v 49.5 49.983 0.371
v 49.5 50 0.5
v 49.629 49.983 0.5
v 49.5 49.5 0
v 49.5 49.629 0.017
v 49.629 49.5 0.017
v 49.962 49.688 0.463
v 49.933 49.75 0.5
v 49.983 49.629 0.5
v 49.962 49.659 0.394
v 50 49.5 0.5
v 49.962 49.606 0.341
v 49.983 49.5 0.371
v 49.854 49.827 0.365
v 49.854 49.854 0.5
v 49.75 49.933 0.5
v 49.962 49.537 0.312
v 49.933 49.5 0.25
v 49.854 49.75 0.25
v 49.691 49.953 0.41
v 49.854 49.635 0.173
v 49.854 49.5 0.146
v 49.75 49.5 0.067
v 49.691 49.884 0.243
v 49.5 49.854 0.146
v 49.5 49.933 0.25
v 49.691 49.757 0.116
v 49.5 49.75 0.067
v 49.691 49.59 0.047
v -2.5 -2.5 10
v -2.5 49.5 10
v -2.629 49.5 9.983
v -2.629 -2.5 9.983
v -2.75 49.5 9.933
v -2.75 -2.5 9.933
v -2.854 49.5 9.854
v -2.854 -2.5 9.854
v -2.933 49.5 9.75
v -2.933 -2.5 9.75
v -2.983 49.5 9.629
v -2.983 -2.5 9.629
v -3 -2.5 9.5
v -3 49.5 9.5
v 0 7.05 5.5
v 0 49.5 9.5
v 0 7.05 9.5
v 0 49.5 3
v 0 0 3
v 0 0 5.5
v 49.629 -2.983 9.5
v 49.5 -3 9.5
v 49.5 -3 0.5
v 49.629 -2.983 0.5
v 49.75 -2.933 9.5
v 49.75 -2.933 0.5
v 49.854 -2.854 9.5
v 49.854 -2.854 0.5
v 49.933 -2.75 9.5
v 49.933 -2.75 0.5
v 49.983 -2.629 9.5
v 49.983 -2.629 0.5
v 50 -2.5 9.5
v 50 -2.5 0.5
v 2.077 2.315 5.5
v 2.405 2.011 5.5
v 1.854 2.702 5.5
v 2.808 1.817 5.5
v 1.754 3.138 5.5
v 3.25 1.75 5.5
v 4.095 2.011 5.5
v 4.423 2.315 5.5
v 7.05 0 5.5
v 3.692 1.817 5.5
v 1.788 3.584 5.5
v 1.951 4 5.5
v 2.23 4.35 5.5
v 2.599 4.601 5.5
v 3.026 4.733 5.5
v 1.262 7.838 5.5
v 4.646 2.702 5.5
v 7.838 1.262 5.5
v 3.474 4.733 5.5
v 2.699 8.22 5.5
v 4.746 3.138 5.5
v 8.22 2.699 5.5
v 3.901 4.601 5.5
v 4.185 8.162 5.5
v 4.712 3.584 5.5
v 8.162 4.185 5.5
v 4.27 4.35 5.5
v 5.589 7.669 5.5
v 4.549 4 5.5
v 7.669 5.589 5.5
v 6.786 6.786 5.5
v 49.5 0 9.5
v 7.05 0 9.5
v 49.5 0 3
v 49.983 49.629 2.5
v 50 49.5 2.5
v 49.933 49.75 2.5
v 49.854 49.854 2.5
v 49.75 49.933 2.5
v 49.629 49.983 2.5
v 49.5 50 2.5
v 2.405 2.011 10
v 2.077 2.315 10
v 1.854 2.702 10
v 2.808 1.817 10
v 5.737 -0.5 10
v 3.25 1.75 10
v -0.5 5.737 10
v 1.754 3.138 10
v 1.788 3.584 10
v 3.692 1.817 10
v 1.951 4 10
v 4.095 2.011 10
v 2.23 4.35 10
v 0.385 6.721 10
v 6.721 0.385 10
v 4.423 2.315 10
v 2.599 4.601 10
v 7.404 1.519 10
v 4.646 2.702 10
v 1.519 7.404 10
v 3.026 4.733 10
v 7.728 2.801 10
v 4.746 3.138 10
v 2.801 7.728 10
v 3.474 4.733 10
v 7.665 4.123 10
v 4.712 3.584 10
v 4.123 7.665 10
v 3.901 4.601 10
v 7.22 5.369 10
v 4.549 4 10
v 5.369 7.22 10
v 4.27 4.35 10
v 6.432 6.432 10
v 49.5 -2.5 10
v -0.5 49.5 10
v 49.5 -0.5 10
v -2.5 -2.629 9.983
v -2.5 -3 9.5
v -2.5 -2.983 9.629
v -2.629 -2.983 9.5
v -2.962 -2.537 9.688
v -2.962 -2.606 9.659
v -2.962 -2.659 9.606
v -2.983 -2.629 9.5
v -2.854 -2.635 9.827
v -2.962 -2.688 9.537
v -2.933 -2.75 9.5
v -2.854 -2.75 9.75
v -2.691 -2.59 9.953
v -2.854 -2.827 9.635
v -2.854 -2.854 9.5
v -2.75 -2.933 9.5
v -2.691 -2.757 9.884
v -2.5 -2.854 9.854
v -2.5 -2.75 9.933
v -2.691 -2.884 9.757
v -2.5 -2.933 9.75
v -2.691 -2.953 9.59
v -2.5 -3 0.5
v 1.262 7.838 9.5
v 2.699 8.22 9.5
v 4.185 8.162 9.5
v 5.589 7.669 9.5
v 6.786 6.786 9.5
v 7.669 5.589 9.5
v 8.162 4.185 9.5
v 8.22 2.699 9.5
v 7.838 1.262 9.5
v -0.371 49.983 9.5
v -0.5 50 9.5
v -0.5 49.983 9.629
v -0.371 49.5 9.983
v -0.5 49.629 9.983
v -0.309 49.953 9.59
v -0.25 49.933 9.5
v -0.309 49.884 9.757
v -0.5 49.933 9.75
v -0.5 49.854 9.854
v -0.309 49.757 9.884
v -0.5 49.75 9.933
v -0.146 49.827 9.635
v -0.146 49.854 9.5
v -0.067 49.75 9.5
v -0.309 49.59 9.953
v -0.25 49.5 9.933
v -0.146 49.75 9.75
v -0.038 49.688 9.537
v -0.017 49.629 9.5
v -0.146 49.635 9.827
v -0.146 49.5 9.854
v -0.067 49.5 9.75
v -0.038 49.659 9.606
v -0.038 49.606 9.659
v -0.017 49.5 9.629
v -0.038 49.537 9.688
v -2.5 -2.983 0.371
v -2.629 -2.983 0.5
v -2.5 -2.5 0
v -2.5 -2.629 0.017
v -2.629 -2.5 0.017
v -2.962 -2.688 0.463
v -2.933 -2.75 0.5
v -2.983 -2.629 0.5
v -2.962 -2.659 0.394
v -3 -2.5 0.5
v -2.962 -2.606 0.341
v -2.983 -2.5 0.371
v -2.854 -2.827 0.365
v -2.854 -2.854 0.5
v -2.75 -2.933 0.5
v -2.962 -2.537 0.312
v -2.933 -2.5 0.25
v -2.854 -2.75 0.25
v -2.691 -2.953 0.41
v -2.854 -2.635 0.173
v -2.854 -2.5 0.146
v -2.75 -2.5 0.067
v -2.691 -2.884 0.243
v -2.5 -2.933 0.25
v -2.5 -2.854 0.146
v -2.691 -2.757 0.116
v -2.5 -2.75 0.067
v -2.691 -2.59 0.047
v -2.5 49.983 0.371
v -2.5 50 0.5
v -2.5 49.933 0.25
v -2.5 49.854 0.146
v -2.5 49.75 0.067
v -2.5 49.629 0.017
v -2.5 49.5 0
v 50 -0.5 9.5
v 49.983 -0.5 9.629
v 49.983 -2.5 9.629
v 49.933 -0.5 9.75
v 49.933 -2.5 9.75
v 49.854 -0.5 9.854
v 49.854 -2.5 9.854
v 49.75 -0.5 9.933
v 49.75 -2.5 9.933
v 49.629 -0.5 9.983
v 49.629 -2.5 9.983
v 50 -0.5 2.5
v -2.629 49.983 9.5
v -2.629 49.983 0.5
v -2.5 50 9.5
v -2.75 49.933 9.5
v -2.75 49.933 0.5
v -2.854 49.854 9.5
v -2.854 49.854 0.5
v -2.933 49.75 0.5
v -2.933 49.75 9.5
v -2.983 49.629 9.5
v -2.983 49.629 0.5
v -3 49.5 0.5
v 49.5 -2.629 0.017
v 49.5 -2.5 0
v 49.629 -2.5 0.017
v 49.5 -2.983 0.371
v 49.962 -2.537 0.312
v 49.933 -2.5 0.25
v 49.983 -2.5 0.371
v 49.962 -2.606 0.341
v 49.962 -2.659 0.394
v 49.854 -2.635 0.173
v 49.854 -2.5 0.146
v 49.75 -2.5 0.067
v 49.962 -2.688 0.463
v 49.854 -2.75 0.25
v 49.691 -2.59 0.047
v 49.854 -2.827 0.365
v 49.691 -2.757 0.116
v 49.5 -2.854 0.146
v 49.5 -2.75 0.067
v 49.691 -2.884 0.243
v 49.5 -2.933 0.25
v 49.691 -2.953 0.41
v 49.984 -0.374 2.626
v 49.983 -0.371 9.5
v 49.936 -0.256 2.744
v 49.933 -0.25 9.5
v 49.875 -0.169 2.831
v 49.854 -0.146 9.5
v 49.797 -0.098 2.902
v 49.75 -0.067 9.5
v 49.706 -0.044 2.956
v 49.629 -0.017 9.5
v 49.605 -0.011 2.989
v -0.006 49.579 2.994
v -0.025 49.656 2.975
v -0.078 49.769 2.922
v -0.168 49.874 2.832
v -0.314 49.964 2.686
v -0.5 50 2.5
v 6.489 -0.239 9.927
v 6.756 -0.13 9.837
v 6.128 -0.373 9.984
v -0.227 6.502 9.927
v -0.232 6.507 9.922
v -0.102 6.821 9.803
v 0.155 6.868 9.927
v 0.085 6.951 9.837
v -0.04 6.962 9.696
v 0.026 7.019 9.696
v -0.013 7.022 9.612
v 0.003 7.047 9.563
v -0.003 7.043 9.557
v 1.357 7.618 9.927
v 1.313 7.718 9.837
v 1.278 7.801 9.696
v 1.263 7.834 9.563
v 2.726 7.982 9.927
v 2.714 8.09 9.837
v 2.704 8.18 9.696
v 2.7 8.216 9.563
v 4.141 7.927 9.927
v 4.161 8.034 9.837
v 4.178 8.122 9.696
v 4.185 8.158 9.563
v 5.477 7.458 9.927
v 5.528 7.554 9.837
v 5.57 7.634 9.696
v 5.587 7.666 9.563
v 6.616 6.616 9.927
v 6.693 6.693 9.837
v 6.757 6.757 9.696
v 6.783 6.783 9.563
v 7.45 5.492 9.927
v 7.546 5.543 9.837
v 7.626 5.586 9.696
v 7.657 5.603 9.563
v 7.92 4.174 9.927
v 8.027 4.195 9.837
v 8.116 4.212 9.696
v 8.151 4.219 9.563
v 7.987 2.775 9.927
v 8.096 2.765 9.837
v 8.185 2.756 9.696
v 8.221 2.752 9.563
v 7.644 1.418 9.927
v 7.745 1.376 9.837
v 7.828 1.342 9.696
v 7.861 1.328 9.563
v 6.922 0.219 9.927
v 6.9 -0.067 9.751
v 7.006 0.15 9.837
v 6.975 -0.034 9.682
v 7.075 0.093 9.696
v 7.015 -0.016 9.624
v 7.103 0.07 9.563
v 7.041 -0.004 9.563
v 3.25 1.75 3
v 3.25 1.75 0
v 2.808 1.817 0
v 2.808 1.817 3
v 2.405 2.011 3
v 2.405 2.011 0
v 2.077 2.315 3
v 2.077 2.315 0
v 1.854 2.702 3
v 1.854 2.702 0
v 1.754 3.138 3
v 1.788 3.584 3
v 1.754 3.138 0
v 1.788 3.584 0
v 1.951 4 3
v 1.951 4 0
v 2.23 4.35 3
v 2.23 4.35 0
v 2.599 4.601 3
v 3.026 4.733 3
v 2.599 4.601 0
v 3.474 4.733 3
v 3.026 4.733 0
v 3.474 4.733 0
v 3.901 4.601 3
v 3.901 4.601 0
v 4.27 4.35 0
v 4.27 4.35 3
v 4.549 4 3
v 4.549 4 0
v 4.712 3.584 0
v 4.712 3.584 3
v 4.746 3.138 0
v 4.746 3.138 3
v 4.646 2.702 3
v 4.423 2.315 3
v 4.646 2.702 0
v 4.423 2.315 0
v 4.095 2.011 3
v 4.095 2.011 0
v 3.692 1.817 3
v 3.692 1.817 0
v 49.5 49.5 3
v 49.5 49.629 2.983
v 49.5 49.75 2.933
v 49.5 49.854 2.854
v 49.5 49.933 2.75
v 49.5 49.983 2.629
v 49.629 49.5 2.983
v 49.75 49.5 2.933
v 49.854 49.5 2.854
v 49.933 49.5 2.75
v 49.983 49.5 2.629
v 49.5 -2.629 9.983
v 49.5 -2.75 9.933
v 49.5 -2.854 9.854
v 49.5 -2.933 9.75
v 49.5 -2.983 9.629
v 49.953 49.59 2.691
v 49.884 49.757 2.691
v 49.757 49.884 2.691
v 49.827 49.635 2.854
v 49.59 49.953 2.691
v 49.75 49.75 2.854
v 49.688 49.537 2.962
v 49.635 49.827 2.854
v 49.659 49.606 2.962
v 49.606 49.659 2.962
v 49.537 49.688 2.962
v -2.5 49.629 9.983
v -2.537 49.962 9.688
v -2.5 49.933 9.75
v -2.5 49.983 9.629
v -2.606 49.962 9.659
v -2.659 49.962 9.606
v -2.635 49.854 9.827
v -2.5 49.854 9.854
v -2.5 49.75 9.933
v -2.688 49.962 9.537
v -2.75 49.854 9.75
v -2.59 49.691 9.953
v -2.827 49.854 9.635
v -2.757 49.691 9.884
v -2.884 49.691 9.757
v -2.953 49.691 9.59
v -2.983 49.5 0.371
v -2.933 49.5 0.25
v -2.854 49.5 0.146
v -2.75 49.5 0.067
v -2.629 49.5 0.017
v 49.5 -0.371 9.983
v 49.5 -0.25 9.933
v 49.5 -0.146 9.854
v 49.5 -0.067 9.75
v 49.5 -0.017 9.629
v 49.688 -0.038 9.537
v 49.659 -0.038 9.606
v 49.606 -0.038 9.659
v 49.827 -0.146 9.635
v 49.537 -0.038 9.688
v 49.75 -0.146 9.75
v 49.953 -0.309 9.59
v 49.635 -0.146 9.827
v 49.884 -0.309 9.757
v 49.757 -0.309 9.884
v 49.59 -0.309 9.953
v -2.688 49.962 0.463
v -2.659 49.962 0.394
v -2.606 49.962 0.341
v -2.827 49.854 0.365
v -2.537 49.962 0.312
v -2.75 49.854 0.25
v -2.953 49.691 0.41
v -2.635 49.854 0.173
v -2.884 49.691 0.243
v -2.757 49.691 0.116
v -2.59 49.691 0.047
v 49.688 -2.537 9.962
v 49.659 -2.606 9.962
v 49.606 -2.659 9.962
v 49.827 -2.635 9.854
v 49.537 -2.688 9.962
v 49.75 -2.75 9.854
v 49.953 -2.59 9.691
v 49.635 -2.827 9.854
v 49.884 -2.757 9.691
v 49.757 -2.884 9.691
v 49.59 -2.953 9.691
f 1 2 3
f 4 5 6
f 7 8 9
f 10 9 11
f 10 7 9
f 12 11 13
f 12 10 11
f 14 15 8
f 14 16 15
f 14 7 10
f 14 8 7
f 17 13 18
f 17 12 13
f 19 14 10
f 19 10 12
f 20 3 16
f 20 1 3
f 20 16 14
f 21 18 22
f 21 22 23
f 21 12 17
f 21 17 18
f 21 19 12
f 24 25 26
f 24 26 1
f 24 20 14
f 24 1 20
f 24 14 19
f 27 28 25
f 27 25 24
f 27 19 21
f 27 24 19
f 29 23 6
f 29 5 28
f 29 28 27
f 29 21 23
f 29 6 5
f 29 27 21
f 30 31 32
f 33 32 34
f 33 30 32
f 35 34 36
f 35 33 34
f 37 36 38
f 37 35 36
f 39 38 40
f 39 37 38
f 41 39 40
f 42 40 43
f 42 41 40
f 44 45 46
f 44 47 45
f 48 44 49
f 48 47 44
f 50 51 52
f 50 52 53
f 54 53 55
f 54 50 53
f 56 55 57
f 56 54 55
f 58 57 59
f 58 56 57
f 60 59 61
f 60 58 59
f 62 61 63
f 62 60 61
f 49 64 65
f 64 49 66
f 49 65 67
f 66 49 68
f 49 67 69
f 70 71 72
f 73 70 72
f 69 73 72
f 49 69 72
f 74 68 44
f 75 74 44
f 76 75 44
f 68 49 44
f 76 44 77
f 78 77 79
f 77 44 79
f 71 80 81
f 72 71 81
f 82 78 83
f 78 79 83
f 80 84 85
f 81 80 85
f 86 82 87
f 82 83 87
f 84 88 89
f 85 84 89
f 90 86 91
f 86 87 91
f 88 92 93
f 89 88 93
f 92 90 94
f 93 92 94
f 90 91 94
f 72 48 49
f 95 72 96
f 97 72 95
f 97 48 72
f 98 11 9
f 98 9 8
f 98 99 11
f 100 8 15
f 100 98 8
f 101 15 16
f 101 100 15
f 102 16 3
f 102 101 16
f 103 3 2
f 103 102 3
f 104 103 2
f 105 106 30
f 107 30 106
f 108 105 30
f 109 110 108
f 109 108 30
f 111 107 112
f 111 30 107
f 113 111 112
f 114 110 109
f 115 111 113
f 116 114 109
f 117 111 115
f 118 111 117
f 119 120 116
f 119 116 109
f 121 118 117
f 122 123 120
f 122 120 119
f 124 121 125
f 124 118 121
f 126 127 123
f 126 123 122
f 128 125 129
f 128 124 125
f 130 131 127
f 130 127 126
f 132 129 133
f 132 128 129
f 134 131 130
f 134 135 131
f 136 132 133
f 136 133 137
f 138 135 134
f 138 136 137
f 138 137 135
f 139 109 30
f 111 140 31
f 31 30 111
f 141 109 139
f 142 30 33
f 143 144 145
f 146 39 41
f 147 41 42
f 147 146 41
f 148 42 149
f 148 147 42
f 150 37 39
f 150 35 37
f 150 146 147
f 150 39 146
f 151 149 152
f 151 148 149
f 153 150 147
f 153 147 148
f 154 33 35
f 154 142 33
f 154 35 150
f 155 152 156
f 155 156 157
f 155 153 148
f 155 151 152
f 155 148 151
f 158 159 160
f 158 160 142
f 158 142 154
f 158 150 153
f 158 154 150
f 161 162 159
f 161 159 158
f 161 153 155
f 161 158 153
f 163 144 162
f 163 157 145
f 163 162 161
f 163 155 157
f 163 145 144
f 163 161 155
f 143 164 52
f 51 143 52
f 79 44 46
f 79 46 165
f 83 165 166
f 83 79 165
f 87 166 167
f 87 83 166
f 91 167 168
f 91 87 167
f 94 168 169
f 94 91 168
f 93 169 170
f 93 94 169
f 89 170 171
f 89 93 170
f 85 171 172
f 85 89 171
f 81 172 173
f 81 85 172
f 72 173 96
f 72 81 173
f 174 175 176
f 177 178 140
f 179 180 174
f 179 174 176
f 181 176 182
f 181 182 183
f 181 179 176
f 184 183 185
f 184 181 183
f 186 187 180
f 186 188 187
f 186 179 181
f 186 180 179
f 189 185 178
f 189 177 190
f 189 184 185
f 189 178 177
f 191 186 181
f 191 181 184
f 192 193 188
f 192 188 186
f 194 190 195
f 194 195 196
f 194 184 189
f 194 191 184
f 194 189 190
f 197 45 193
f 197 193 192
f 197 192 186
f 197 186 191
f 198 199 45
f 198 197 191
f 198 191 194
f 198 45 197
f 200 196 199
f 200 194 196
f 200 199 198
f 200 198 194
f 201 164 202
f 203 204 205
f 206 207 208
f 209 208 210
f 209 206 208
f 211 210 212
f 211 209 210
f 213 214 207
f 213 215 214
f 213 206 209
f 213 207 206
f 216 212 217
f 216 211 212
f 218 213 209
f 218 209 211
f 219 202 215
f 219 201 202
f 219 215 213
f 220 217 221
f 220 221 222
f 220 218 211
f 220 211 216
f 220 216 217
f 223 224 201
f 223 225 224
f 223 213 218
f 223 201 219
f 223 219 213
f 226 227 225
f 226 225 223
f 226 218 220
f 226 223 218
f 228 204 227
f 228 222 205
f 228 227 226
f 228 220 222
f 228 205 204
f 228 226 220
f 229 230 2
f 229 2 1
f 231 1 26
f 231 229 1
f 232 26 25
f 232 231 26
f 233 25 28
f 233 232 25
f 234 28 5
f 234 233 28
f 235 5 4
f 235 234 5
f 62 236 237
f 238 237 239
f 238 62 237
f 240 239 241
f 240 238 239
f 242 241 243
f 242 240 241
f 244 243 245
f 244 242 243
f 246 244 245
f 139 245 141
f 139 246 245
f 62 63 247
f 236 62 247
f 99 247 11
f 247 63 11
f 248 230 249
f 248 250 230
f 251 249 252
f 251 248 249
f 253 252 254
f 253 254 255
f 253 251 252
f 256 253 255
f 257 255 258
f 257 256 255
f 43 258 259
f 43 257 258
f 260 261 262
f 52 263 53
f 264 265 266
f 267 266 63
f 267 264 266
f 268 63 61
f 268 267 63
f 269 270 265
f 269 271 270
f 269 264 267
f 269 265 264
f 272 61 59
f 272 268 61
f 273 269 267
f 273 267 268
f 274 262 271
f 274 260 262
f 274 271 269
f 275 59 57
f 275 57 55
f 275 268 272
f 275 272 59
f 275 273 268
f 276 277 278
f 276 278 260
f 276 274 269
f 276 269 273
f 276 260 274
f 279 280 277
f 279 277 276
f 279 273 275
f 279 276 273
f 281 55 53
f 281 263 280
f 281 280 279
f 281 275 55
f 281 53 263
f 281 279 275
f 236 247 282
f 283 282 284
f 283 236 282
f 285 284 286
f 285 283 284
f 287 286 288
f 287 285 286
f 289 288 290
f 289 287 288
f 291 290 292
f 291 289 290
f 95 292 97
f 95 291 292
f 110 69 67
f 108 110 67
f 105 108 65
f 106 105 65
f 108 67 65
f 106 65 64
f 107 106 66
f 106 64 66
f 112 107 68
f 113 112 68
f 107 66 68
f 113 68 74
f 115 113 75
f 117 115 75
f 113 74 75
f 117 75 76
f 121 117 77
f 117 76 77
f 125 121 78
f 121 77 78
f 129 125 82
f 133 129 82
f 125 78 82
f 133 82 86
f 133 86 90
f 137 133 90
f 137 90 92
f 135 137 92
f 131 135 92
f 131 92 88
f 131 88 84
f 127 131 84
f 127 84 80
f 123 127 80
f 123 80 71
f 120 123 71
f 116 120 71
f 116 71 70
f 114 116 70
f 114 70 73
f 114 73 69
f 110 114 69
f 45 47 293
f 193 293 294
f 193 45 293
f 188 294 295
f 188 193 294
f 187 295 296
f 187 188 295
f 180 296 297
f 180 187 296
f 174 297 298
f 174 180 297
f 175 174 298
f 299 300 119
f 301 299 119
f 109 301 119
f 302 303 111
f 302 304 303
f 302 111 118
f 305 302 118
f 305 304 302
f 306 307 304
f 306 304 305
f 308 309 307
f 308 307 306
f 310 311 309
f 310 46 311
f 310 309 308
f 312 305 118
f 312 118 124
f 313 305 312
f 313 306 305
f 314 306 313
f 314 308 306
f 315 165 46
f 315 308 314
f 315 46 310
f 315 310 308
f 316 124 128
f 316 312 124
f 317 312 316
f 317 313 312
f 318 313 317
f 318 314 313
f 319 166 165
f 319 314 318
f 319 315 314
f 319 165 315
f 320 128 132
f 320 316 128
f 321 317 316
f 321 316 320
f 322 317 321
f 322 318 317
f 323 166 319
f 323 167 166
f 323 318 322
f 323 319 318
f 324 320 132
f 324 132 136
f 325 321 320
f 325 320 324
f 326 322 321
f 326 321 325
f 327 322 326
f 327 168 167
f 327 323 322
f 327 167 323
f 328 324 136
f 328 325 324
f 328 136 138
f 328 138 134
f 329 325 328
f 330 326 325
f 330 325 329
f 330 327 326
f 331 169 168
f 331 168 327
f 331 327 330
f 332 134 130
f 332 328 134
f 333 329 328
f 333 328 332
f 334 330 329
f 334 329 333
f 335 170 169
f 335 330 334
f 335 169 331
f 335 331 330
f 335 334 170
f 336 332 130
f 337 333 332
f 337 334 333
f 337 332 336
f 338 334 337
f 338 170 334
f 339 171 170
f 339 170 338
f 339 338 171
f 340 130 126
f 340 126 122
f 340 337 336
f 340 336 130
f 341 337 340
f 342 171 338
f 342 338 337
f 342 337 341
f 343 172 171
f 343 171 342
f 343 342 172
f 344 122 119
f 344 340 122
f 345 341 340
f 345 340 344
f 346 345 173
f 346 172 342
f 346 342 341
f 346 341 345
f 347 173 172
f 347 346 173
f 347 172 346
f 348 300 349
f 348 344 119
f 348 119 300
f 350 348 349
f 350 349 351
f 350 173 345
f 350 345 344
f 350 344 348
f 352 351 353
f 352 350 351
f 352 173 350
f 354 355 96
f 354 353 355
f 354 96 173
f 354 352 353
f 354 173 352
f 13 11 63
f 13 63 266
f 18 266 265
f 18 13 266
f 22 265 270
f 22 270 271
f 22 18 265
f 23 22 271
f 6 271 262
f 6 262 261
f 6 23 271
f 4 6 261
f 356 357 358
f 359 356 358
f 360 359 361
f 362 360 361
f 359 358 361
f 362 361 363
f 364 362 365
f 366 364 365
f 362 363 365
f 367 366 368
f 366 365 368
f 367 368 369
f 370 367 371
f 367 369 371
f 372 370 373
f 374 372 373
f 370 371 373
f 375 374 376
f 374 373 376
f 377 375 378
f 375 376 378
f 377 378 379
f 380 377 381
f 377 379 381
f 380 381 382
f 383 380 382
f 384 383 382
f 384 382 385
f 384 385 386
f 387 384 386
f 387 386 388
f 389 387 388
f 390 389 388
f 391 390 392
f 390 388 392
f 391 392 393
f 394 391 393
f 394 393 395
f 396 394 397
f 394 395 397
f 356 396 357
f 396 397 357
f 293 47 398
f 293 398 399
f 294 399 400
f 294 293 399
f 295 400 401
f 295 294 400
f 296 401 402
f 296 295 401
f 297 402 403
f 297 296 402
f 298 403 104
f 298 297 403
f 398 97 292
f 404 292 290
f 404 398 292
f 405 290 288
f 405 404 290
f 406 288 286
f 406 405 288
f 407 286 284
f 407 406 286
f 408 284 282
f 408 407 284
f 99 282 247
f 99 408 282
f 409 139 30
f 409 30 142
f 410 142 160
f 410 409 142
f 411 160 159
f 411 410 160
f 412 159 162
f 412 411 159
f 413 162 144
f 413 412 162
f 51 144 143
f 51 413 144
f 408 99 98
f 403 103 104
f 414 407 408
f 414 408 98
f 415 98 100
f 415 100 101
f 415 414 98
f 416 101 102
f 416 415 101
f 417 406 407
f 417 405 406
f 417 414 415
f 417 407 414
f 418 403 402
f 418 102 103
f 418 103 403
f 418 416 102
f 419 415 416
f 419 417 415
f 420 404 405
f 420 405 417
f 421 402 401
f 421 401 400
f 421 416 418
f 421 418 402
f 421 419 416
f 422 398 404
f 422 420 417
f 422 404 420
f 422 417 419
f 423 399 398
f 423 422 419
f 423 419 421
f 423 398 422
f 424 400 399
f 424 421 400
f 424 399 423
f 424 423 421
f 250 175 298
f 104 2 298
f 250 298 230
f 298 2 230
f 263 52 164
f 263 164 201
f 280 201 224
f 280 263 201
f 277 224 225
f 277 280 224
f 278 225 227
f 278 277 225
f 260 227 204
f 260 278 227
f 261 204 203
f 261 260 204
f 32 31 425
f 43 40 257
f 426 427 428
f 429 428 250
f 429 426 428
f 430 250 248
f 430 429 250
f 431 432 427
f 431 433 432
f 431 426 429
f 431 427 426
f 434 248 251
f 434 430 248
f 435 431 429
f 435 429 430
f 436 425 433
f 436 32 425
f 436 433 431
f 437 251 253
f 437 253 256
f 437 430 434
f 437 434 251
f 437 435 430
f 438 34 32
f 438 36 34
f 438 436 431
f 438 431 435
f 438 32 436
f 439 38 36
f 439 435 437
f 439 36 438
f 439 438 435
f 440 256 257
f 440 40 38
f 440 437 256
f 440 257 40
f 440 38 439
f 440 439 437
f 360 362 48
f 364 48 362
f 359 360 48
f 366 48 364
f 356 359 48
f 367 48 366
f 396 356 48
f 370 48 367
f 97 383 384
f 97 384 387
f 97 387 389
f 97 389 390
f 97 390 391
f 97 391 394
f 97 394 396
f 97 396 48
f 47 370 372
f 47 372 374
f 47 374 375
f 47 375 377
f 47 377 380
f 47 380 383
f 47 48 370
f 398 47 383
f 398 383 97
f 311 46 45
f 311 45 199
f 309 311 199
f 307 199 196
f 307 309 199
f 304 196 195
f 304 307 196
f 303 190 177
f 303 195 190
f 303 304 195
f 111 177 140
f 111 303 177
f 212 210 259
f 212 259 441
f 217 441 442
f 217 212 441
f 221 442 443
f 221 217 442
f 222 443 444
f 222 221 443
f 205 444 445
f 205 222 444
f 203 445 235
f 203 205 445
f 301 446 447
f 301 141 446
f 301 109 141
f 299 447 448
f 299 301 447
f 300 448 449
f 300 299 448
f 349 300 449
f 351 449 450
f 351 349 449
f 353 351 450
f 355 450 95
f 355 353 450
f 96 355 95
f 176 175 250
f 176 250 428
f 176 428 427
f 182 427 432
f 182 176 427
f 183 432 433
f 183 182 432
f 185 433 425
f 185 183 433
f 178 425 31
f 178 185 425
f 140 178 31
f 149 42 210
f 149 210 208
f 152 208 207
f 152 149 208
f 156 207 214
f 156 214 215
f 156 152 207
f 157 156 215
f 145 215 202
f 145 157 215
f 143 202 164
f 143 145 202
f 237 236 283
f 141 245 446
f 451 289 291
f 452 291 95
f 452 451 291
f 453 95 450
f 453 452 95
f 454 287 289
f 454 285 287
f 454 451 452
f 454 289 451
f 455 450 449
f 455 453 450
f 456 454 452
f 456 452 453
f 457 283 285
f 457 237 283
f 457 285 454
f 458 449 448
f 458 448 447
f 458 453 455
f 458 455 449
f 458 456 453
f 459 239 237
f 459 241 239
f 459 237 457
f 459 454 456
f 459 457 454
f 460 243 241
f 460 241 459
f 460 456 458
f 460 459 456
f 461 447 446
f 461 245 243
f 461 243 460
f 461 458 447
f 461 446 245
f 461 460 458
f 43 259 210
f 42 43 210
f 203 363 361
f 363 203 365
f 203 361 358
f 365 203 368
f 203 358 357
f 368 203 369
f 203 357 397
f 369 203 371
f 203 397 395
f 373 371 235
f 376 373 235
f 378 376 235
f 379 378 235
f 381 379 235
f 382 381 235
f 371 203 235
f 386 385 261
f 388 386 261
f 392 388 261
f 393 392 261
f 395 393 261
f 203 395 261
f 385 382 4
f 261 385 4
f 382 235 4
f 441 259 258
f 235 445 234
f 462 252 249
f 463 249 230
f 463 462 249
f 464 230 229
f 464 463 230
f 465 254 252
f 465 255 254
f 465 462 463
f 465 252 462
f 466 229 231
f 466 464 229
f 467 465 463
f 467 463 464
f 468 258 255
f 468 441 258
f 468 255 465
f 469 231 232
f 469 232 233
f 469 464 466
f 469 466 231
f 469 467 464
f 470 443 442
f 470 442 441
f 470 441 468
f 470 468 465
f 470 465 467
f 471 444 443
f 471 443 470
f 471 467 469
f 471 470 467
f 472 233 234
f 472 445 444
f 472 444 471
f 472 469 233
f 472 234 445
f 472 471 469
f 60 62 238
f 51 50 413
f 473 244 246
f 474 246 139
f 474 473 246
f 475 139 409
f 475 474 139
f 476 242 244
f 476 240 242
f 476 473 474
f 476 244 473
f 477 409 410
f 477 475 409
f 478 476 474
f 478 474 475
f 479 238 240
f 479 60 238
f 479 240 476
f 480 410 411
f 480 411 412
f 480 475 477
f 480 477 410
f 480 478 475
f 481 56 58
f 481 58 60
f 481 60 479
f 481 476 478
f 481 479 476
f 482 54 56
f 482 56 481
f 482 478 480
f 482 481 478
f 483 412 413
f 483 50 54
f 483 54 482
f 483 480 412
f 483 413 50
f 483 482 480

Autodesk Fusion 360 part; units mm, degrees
sketch "Sketch1" plane through (0, 0, 0) normal (0, 0, 1) x (1, 0, 0)
  line L0 (0, 0) -> (50, 0)
  line L1 (50, 0) -> (50, 50)
  line L2 (50, 50) -> (0, 50)
  line L3 (0, 50) -> (0, 0)
  dimension "d1" = 50
  dimension "d2" = 50
extrude "Extrude1" add sketch "Sketch1" along normal blind 3
sketch "Sketch2" plane through (0, 0, 0) normal (0, 0, 1) x (1, 0, 0)
  line L0 (50, 50) -> (0, 50)
  line L1 (50, 0) -> (50, 50)
  line L2 (0, 0) -> (50, 0)
  line L3 (0, 50) -> (0, 0)
  line L4 (-3, 50) -> (-3, -3)
  line L5 (-3, -3) -> (50, -3)
  line L6 (-3, 50) -> (0, 50)
  line L7 (50, 0) -> (50, -3)
  dimension "d8" = 3
extrude "Extrude2" add sketch "Sketch2" along normal blind 10 contours L2 L3 L4 L5 L6 L7
ref_plane "WorkPlane1" through (25, 25, 5.5) normal (0, 0, 1) x (1, 0, 0)
sketch "Sketch4" plane through (0, 0, 5.5) normal (0, 0, 1) x (1, 0, 0)
  circle A0 centre (3.25, 3.25) radius 5
  line L0 (0, 0) -> (0, 50)
  line L1 (50, 0) -> (0, 0)
  dimension "d15" = 3.25
  dimension "d16" = 3.25
  dimension "d25" = 10
extrude "Extrude3" add sketch "Sketch4" along normal blind 4.5 contours A0 L0 L1 picked at (4.5229, 4.5125)
sketch "Sketch5" plane through (0, 0, 10) normal (0, 0, 1) x (-1, 0, 0)
  line L0 (3, -50) -> (3, 3)
  line L1 (3, 3) -> (-50, 3)
  line L2 (-50, 3) -> (-50, 0)
  line L3 (-50, 0) -> (-7.0497, 0)
  arc A0 (-7.0497, 0) -> (0, -7.0497) centre (-3.25, -3.25) ccw
  line L4 (0, -7.0497) -> (0, -50)
  line L5 (0, -50) -> (3, -50)
hole "Hole2" at (3.25, 3.25, 10) direction (0, 0, -1) diameter 3 end up to surface (10 mm away)
fillet "Fillet1" radius 0.5 12 edges at (23.5, -3, 0) (50, -3, 5) (23.5, -3, 10) (-3, -3, 5) (-3, 23.5, 0) (-3, 23.5, 10) (23.5, 50, 0) (50, 23.5, 0) (-1.5, 50, 10) (-3, 50, 5) (50, -1.5, 10) (50, 50, 1.5)
fillet "Fillet2" radius 0.5 10 edges at (50, 0, 6.25) (49.8536, 0, 9.8536) (28.2748, 0, 10) (0, 28.2748, 10) (0, 49.8536, 9.8536) (0, 50, 6.25) (50, 24.75, 3) (49.8536, 49.8536, 3) (24.75, 50, 3) (6.7855, 6.7855, 10)
equation "d16 = d15"
equation "d17 = 7 mm - 2.5 mm"
